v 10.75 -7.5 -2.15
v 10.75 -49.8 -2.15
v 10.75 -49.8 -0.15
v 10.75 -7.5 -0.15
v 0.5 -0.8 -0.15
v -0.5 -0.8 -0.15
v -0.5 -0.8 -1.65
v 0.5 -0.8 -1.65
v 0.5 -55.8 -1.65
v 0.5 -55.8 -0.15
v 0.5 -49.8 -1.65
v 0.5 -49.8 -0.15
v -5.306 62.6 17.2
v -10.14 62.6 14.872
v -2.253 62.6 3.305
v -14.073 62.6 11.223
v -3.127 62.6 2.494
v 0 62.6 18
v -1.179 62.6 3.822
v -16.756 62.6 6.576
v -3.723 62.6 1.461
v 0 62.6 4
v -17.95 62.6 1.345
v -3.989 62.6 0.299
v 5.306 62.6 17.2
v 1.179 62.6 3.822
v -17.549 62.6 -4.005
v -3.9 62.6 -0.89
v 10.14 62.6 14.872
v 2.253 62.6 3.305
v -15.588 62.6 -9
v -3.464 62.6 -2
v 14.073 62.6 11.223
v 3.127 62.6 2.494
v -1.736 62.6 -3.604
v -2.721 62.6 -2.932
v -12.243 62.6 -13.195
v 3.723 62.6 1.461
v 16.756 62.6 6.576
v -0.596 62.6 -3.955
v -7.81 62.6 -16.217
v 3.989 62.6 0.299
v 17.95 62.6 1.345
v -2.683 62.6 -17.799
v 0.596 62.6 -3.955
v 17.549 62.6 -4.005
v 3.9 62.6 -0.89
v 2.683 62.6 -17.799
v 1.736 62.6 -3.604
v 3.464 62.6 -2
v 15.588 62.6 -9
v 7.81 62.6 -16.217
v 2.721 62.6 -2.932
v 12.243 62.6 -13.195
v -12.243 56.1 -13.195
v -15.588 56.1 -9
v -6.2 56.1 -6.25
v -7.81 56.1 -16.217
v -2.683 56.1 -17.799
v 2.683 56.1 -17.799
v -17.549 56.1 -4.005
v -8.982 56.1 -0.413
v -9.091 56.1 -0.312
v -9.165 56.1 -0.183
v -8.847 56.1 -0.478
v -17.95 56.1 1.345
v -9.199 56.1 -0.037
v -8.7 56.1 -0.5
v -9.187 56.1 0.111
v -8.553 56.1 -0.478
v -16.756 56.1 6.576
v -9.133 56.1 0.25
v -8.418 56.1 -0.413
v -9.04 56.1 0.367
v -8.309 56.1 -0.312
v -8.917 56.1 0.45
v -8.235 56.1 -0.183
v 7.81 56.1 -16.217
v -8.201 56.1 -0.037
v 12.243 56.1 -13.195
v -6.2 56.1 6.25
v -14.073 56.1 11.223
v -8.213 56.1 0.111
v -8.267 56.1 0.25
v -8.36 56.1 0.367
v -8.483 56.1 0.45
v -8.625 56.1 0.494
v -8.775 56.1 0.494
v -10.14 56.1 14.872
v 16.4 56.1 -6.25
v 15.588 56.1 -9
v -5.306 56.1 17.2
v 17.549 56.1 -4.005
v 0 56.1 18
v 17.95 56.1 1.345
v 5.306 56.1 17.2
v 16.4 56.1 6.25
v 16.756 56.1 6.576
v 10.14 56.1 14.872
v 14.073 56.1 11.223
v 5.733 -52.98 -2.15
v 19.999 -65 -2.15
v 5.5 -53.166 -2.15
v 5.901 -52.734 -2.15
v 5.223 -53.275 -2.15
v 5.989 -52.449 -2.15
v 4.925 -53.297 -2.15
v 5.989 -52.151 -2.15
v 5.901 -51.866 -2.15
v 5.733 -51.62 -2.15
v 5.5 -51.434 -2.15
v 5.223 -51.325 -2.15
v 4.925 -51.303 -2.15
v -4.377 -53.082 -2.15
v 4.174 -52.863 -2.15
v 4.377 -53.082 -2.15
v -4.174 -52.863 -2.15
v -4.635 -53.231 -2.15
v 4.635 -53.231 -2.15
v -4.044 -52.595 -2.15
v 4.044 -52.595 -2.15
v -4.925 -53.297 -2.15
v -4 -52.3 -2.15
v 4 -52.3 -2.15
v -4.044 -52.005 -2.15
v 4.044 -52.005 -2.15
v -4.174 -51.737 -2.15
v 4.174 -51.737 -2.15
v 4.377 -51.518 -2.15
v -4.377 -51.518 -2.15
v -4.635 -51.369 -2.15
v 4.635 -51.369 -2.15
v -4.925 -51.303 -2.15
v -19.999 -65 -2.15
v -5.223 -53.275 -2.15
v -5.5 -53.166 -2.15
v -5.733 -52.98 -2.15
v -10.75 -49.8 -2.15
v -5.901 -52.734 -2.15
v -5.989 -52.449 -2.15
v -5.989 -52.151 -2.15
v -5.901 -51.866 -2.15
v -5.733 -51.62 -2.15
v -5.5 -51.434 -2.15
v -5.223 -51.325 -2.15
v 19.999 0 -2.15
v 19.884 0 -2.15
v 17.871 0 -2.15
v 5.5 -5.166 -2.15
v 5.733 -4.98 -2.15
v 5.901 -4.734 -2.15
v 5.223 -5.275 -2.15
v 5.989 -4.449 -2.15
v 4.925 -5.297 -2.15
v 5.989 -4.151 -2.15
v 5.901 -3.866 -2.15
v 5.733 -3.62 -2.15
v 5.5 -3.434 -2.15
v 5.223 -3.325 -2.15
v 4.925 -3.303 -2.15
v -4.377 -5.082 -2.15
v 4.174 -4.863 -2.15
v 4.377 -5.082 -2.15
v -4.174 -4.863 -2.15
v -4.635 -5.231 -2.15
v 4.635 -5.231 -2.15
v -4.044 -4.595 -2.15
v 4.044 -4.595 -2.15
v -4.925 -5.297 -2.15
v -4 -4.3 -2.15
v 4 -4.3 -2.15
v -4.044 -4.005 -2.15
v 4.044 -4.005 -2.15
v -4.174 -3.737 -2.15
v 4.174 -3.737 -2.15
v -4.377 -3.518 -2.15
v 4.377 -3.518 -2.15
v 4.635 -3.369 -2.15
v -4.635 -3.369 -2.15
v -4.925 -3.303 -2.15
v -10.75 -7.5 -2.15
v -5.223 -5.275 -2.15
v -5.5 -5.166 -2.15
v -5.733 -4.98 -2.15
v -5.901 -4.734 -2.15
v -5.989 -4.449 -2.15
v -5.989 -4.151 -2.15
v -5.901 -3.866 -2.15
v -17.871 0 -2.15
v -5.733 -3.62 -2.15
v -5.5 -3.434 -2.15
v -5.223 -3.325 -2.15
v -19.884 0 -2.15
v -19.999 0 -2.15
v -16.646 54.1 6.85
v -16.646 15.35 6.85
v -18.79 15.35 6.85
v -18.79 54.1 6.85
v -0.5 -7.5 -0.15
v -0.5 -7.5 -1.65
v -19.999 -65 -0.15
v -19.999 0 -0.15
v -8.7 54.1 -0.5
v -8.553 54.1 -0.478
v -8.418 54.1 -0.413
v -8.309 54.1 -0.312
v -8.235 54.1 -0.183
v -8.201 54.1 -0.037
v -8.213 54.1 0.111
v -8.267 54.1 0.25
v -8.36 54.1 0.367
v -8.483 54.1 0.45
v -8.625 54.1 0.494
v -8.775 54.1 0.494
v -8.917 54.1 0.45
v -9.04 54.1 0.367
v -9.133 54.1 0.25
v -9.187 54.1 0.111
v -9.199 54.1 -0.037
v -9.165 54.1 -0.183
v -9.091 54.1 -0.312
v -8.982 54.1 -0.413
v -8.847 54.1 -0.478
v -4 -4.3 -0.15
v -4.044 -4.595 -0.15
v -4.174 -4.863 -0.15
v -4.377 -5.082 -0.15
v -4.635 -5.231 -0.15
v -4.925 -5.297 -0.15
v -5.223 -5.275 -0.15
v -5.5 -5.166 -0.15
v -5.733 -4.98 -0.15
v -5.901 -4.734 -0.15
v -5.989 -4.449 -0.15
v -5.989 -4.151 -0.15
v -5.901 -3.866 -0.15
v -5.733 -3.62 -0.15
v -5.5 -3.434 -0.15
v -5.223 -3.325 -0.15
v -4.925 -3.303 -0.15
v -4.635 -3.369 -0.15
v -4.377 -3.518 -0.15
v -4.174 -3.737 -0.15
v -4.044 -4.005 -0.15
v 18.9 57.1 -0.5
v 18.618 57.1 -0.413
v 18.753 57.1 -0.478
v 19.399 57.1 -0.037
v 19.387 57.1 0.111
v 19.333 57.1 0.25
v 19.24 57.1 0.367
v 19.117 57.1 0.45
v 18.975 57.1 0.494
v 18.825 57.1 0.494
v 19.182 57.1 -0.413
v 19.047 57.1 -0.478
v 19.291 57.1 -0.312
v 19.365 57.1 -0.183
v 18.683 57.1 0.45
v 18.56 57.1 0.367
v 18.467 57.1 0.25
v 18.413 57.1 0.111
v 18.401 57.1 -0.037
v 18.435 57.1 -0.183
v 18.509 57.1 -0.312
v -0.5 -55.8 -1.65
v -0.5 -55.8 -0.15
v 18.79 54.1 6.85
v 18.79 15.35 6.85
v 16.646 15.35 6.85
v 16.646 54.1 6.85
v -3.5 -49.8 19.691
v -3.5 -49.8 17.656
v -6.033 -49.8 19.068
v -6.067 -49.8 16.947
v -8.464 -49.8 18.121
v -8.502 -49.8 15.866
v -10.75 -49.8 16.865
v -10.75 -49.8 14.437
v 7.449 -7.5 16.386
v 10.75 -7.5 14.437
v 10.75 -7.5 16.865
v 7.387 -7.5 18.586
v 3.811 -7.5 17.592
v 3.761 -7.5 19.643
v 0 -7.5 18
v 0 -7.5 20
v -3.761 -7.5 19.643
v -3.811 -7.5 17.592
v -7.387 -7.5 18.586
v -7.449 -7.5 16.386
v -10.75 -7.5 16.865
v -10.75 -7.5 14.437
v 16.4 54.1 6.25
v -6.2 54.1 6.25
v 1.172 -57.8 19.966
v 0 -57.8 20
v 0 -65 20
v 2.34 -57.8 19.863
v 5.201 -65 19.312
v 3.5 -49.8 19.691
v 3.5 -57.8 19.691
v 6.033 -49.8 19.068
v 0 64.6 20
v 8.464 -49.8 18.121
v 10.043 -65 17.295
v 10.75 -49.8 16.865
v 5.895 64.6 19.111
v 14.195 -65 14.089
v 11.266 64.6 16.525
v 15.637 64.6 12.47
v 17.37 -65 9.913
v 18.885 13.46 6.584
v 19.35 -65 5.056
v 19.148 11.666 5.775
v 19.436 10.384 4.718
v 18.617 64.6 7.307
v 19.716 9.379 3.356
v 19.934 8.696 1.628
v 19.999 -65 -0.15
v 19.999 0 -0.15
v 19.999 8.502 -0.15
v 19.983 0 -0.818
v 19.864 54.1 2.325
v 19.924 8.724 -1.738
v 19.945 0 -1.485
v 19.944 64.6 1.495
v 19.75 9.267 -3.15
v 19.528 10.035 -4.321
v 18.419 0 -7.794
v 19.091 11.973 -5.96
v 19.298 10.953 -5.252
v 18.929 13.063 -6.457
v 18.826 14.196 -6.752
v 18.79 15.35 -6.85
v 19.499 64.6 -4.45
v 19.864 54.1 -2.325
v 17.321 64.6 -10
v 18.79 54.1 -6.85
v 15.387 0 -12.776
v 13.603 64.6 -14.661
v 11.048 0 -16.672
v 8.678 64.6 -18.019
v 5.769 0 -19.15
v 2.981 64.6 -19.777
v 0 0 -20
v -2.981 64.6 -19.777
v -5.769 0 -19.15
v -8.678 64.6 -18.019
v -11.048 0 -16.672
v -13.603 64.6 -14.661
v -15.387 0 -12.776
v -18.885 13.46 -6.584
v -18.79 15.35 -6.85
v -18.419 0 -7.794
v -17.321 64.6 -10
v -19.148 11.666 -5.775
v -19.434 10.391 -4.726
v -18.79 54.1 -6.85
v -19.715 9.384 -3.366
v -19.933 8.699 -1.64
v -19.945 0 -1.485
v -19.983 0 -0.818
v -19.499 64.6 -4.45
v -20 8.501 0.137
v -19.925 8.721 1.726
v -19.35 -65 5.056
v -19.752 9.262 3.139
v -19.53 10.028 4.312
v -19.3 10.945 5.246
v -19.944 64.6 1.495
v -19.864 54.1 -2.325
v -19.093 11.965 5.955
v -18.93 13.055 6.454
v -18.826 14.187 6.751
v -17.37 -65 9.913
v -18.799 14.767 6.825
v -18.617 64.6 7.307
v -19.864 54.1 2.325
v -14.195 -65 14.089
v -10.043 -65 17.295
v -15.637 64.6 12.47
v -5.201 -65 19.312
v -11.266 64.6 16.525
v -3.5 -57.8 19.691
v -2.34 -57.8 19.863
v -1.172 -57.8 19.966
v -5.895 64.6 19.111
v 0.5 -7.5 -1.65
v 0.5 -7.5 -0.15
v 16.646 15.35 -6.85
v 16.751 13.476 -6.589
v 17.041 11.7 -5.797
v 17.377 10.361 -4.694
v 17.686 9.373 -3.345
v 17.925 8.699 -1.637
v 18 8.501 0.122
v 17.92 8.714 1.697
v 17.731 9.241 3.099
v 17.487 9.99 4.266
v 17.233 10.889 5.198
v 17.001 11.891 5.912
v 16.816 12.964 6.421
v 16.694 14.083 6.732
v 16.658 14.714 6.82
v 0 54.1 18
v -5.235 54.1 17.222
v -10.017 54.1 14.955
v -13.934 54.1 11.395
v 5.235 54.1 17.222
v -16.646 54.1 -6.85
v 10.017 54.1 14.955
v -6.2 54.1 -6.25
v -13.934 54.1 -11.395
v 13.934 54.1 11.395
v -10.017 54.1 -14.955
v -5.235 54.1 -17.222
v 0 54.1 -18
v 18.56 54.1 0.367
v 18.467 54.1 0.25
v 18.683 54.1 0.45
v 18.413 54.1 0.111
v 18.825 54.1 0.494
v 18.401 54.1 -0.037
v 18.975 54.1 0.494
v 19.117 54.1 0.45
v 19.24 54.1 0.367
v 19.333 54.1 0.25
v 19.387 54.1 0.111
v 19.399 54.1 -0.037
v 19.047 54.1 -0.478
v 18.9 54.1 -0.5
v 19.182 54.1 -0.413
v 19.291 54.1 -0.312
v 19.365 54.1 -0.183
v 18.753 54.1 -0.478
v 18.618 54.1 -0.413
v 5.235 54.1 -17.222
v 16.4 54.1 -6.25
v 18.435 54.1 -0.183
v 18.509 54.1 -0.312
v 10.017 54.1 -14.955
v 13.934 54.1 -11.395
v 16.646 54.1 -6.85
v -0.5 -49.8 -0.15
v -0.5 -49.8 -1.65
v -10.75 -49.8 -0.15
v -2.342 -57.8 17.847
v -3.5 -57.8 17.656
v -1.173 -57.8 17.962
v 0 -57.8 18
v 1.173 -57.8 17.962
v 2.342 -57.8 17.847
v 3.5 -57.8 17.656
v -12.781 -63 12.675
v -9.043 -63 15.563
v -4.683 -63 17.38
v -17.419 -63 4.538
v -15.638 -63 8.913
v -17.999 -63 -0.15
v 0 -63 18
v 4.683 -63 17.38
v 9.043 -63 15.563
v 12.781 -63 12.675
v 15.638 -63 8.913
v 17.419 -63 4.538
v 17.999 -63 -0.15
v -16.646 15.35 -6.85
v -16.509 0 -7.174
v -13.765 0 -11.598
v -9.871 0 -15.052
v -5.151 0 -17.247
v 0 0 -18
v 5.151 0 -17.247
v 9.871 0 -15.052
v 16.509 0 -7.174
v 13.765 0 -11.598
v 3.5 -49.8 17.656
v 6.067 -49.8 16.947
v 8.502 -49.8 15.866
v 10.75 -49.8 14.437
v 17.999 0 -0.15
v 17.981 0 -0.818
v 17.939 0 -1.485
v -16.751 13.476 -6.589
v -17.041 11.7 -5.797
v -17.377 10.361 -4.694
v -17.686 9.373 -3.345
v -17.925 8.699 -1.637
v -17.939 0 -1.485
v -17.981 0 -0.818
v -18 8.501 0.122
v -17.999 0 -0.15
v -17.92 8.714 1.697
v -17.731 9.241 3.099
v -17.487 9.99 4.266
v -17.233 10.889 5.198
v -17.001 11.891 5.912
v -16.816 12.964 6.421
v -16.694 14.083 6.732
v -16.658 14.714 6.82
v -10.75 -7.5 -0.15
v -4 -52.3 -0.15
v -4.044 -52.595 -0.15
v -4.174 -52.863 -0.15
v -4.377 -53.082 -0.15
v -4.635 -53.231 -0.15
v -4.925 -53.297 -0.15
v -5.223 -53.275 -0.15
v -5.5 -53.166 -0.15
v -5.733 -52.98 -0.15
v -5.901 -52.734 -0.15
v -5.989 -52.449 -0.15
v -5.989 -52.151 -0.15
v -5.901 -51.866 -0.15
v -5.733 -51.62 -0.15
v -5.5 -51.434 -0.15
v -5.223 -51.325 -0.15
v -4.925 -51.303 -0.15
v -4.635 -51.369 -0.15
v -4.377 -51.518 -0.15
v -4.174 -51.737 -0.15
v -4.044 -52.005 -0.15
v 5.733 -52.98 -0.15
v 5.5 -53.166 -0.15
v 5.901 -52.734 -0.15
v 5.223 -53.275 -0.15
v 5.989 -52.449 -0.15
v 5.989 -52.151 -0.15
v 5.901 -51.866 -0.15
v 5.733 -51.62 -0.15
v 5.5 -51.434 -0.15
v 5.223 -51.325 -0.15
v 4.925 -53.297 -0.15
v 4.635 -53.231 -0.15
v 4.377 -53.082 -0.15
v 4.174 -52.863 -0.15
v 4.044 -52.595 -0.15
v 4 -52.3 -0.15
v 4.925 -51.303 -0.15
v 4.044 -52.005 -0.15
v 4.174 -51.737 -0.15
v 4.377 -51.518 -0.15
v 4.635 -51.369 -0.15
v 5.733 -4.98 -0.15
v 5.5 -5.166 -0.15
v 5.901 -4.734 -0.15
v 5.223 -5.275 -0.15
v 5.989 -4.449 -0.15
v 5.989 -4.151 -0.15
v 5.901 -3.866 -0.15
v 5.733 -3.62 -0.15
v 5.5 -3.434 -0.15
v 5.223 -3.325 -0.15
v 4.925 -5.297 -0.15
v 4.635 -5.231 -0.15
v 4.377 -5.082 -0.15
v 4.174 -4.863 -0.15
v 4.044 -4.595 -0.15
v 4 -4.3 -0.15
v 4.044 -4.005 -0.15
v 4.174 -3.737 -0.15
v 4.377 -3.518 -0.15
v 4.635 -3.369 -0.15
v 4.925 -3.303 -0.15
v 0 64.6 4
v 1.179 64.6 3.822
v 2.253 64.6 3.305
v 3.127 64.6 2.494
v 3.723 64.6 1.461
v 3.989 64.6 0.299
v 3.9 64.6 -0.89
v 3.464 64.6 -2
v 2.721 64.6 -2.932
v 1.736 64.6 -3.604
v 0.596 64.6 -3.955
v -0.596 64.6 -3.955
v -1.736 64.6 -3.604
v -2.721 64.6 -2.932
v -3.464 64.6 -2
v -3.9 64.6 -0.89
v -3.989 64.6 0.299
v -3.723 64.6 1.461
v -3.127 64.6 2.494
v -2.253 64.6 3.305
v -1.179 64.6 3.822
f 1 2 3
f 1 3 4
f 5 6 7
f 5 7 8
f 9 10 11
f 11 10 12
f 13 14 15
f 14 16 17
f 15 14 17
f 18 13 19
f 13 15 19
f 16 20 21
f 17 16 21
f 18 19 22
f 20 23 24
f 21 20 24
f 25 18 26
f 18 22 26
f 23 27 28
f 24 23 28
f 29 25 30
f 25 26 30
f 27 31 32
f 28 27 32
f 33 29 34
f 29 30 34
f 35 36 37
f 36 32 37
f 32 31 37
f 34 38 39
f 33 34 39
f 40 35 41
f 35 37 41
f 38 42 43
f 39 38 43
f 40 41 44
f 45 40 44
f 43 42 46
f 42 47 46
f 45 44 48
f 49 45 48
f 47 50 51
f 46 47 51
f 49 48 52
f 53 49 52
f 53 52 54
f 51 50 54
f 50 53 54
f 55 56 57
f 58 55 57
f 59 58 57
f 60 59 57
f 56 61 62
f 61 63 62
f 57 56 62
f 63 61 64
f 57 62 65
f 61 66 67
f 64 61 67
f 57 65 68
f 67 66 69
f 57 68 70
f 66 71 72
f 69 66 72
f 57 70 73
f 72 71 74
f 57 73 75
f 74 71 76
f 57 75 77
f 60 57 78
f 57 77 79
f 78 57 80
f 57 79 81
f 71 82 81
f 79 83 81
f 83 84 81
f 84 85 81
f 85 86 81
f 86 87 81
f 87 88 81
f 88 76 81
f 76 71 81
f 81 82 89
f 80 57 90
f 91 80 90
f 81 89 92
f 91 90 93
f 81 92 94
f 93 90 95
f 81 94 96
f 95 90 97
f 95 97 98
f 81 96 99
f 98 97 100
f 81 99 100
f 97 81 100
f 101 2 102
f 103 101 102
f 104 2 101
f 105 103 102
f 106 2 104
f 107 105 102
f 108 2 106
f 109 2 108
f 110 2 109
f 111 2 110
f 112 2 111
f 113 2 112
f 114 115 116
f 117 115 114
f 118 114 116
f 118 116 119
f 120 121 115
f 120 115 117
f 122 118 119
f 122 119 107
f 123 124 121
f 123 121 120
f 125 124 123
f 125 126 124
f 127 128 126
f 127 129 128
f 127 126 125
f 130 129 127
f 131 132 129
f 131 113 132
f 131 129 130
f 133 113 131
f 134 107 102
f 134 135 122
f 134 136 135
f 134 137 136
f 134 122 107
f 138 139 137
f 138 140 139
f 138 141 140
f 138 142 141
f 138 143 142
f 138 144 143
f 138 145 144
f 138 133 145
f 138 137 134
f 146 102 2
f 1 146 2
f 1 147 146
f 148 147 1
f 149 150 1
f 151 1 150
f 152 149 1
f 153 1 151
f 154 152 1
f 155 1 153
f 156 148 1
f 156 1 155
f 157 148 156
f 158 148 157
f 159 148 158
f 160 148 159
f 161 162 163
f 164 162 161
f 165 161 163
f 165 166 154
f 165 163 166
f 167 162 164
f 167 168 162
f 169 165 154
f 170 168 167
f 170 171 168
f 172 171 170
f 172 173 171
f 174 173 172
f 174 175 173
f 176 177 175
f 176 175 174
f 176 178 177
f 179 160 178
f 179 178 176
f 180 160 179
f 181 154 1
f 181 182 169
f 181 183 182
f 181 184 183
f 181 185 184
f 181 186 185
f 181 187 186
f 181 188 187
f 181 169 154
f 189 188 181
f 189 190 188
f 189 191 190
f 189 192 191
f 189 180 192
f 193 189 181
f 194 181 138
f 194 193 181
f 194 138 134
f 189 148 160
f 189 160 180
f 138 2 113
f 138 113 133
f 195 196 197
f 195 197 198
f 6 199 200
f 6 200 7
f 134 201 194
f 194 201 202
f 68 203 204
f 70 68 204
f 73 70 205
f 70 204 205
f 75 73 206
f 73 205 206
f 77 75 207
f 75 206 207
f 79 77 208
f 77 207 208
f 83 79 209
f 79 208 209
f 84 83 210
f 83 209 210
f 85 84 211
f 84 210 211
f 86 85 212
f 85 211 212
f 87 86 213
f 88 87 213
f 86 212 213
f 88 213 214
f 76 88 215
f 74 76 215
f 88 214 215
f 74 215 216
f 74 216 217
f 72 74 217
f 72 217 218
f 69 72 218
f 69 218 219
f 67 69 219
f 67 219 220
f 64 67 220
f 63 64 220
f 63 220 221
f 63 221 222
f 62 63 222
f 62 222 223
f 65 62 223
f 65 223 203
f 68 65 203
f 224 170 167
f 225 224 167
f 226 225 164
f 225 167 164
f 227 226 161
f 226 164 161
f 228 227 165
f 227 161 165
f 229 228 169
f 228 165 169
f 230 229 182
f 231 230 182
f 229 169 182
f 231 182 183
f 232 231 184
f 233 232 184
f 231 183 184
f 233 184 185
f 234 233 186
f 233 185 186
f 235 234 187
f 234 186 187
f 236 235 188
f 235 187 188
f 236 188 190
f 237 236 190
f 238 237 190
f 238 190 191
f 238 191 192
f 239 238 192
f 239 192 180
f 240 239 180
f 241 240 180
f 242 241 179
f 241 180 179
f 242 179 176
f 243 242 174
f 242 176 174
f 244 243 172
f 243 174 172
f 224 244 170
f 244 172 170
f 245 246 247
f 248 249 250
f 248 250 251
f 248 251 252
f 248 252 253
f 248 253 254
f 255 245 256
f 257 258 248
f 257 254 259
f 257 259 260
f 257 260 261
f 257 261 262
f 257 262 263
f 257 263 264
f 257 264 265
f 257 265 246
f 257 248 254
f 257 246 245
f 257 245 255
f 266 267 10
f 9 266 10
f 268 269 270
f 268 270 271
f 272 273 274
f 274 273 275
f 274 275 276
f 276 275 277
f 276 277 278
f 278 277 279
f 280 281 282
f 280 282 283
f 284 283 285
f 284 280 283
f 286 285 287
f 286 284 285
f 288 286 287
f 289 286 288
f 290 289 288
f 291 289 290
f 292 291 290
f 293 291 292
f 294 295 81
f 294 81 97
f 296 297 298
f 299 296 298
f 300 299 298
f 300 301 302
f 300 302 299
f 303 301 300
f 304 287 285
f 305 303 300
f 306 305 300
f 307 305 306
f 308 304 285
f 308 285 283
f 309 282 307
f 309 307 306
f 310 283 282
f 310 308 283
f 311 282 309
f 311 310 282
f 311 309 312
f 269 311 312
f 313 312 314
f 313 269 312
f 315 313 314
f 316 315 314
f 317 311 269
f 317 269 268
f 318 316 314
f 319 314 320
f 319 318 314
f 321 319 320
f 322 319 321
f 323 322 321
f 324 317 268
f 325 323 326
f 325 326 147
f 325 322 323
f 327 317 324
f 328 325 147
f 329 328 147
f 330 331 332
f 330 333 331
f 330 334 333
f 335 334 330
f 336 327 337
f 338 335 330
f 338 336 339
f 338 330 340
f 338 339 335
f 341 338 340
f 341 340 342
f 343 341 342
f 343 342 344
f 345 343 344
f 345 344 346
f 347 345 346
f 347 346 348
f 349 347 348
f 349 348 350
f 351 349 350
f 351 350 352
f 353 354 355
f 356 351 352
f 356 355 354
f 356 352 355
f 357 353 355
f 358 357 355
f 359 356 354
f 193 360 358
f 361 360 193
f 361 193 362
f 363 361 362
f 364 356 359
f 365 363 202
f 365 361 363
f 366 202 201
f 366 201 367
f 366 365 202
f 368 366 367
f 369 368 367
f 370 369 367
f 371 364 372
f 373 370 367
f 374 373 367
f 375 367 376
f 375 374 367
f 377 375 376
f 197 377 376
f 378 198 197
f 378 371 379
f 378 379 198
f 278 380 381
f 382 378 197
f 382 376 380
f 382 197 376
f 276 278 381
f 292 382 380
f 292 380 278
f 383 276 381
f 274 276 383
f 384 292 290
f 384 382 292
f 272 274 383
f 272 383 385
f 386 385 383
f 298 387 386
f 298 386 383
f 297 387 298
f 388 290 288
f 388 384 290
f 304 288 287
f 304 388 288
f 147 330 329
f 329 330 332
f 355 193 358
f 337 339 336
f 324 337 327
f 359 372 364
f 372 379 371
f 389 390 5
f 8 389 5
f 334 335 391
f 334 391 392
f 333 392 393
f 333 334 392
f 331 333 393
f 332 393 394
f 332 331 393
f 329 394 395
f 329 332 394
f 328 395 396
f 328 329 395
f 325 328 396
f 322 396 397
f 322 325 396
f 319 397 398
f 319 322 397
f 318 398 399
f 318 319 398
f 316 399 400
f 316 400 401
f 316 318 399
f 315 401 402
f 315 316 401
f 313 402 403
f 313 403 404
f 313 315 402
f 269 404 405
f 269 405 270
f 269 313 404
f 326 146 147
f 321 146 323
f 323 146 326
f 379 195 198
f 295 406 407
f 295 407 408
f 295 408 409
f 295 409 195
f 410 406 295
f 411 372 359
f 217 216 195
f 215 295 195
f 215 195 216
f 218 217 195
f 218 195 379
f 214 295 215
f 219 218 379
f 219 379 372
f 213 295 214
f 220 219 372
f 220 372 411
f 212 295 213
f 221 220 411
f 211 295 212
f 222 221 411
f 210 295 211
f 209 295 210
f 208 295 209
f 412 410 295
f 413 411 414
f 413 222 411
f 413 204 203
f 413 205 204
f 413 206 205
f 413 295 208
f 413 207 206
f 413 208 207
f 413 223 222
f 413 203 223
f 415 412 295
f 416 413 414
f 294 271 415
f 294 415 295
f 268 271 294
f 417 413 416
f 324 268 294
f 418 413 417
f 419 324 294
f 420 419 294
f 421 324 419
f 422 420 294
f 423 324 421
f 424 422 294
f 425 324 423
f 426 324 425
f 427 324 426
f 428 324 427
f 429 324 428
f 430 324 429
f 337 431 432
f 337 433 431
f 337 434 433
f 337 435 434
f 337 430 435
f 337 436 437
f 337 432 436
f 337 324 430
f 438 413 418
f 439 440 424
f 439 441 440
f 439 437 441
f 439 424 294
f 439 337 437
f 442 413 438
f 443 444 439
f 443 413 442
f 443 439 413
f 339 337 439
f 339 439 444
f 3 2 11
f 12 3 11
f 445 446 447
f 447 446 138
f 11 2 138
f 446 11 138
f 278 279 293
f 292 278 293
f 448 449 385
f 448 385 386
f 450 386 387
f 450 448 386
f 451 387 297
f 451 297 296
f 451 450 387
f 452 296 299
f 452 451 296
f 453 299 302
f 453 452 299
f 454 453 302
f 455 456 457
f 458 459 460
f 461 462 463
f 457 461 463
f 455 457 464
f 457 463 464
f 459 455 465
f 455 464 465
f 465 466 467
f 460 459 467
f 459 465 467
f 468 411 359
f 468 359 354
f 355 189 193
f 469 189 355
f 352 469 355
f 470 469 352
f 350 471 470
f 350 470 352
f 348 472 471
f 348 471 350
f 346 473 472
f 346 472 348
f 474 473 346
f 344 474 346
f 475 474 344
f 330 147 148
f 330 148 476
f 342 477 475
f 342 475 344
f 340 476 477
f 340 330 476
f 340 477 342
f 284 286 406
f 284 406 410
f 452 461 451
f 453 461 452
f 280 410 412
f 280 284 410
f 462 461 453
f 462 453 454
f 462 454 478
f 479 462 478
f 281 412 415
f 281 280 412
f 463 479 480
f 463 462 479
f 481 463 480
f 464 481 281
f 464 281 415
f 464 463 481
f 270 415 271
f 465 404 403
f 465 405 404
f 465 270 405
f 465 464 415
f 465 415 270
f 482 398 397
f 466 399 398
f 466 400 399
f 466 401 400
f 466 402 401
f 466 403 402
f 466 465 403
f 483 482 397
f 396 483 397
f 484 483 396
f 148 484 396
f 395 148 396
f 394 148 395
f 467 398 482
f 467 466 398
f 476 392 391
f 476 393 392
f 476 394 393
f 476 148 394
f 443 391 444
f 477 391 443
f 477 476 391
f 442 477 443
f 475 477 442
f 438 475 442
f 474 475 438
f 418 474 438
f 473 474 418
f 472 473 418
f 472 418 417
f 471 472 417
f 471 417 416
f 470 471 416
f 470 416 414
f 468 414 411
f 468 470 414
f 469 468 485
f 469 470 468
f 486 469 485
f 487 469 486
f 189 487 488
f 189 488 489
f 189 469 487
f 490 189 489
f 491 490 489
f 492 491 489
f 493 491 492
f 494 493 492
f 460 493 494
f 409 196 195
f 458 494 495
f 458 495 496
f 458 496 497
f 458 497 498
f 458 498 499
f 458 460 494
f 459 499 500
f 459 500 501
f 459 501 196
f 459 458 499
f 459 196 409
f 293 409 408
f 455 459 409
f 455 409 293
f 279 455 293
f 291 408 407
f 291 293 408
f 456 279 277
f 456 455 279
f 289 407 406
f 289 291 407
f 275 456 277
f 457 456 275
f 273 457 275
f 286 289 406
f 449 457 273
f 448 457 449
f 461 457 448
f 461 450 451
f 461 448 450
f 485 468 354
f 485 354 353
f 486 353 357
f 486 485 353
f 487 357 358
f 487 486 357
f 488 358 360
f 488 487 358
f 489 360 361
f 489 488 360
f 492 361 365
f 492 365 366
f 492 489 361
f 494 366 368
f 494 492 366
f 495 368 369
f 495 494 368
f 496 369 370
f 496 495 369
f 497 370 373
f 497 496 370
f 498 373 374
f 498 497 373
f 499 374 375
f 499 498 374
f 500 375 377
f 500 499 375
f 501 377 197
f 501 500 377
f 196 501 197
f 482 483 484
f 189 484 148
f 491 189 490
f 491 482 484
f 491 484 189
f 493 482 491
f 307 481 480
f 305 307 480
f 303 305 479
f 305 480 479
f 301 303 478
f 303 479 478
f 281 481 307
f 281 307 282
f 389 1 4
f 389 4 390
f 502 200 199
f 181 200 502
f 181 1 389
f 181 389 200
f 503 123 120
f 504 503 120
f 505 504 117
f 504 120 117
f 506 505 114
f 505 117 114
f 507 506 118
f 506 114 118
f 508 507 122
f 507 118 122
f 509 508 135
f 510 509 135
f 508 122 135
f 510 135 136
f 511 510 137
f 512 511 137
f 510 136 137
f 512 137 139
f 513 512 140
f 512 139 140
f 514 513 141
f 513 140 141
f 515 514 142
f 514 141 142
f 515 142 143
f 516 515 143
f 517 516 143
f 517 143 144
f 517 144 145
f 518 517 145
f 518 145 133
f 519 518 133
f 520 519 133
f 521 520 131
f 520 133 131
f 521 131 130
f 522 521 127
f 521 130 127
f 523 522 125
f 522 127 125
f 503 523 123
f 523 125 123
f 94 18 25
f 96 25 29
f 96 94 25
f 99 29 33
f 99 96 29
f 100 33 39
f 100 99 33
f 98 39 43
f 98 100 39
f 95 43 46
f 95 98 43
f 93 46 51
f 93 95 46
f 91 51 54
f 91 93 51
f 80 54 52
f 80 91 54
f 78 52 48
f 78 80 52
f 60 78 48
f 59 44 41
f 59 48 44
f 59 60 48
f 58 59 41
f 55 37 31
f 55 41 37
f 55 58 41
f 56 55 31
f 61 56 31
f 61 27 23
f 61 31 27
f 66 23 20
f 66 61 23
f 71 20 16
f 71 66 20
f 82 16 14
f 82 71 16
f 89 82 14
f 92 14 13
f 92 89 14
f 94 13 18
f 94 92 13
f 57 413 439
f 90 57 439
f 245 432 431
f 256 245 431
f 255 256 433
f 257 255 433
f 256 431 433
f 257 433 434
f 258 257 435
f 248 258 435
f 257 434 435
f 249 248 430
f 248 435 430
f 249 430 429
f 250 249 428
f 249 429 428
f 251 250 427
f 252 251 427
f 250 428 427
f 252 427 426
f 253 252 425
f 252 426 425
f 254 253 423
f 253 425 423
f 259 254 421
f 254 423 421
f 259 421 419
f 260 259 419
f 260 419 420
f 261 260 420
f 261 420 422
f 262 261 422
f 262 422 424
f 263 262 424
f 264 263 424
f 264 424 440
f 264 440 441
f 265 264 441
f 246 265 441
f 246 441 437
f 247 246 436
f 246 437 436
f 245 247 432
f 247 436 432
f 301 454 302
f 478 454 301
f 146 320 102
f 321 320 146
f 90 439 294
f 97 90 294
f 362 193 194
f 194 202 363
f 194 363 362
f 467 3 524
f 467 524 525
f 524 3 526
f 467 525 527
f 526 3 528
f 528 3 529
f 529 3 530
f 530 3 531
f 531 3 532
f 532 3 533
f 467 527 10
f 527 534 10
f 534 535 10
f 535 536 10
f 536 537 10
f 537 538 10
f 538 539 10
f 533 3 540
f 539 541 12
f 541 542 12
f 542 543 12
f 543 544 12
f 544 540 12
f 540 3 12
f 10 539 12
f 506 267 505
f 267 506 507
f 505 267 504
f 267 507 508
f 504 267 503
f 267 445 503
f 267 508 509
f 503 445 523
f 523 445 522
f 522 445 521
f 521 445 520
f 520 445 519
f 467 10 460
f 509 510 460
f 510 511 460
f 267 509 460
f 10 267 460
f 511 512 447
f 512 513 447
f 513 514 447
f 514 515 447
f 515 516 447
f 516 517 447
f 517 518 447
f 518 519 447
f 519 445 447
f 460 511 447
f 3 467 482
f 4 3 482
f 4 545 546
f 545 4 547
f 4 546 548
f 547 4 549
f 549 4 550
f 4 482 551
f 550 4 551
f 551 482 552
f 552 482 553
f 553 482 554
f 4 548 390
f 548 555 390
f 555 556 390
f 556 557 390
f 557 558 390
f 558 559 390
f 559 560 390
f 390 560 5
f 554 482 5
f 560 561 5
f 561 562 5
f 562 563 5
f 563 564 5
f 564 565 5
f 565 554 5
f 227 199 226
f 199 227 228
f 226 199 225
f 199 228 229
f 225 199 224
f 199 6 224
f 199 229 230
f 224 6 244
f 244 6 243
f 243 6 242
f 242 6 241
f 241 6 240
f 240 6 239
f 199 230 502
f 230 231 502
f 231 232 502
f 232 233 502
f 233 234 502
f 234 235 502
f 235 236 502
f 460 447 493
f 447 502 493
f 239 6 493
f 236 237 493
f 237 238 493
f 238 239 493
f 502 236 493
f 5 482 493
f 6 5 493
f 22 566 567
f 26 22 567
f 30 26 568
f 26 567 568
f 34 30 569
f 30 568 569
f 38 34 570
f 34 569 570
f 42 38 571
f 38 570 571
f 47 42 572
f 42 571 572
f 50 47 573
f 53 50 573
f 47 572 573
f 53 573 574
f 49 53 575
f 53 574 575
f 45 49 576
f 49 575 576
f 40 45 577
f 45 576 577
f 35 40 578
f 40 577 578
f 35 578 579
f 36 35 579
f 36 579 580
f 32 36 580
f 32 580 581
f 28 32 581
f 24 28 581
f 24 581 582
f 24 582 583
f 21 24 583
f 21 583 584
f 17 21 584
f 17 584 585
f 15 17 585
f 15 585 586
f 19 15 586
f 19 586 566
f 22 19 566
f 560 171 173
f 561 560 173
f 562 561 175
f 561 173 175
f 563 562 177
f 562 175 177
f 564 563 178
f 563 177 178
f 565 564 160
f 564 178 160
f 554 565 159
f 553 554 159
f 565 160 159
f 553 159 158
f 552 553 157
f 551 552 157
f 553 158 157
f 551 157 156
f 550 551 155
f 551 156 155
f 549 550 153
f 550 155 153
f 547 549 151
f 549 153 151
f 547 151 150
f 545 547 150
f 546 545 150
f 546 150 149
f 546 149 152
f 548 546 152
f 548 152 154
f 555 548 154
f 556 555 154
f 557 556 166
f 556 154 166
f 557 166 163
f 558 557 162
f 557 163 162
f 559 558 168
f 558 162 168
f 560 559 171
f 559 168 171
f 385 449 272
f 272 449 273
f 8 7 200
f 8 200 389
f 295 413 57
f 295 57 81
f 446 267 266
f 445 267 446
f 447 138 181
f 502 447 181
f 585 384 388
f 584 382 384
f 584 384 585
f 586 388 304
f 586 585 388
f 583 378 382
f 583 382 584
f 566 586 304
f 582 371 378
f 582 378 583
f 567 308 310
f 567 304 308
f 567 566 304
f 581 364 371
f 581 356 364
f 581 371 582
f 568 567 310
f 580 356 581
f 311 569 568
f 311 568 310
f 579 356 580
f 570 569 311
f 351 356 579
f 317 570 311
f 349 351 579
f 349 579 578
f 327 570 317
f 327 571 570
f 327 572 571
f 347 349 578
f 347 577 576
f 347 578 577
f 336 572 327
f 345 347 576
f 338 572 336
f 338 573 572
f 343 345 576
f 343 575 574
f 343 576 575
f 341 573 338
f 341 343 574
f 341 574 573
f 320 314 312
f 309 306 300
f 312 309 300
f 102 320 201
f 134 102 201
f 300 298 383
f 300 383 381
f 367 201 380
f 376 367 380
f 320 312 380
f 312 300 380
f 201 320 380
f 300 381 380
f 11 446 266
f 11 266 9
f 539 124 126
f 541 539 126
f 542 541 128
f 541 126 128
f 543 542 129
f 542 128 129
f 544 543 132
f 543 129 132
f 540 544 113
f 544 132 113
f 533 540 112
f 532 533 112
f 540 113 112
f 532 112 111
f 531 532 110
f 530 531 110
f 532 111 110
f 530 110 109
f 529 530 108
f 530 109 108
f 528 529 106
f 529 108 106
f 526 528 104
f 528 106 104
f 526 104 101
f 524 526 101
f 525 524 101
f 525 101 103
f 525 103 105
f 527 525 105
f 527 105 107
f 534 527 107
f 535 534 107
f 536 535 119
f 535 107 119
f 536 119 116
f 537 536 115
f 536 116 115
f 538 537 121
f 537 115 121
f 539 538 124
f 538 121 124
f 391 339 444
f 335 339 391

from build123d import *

# Parameters (mm, degrees)
SKETCH1_R           = 20
SKETCH1_R_2         = 18
BOSS_EXTRUDE1_DEPTH = 65
SKETCH2_R           = 18
BOSS_EXTRUDE2_DEPTH = 2
SKETCH4_W           = 24.70942711
SKETCH4_H           = 65
CUT_EXTRUDE1_DEPTH  = 79.89866919
SKETCH5_W           = 39.998874984
SKETCH5_H           = 65
BOSS_EXTRUDE3_DEPTH = 2
SKETCH6_W           = 21.5
SKETCH6_H           = 42.3
CUT_EXTRUDE2_DEPTH  = 72.523580028
SKETCH7_R           = 1
CUT_EXTRUDE3_DEPTH  = 2
SKETCH8_W           = 1
SKETCH8_H           = 55
CUT_EXTRUDE4_DEPTH  = 1.5
BOSS_EXTRUDE4_START = -2.4
SKETCH9_R           = 18
BOSS_EXTRUDE4_DEPTH = 2.4
CUT_EXTRUDE5_DEPTH  = 79.89866919
SKETCH11_R          = 18.596328204
SKETCH11_W          = 22.6
SKETCH11_H          = 12.5
BOSS_EXTRUDE6_DEPTH = 2
SKETCH12_R          = 0.5
CUT_EXTRUDE6_DEPTH  = 3
SKETCH15_R          = 4
CUT_EXTRUDE8_DEPTH  = 5
SKETCH16_R          = 20
CUT_EXTRUDE9_DEPTH  = 0.4
SKETCH18_W          = 7
SKETCH18_H          = 8
CUT_EXTRUDE10_DEPTH = 71.929701261


with BuildPart() as part:
    # Sketch1 → Boss-Extrude1 (new, symmetric)
    with BuildSketch(Plane(origin=(0, 0, 0), x_dir=(1, 0, 0), z_dir=(0, 1, 0))):
        with Locations(Location((0, 0, 0), (0, 0, 270))):
            Circle(SKETCH1_R)
        with Locations(Location((0, 0, 0), (0, 0, 270))):
            Circle(SKETCH1_R_2, mode=Mode.SUBTRACT)
    extrude(amount=BOSS_EXTRUDE1_DEPTH, both=True)

    # Sketch2 → Boss-Extrude2 (add)
    with BuildSketch(Plane.XZ.offset(65)):
        with Locations(Location((0, 0, 0), (0, 0, 270))):
            Circle(SKETCH2_R)
    extrude(amount=-BOSS_EXTRUDE2_DEPTH)

    # Sketch4 → Cut-Extrude1 (cut, through all)
    with BuildSketch(Plane(origin=(20, 0, 0), x_dir=(0, 0, -1), z_dir=(1, 0, 0))):
        with Locations((12.504713555, -32.5)):
            Rectangle(SKETCH4_W, SKETCH4_H)
    extrude(amount=-CUT_EXTRUDE1_DEPTH, mode=Mode.SUBTRACT)

    # Sketch5 → Boss-Extrude3 (add)
    with BuildSketch(Plane(origin=(0, 0, -0.15), x_dir=(-1, 0, 0), z_dir=(0, 0, -1))):
        with Locations((0, -32.5)):
            Rectangle(SKETCH5_W, SKETCH5_H)
    extrude(amount=BOSS_EXTRUDE3_DEPTH)

    # Sketch6 → Cut-Extrude2 (cut, through all)
    with BuildSketch(Plane(origin=(0, 0, -2.15), x_dir=(-1, 0, 0), z_dir=(0, 0, -1))):
        with Locations((0, -28.65)):
            Rectangle(SKETCH6_W, SKETCH6_H)
    extrude(amount=-CUT_EXTRUDE2_DEPTH, mode=Mode.SUBTRACT)

    # Sketch7 → Cut-Extrude3 (cut)
    with BuildSketch(Plane(origin=(0, 0, -2.15), x_dir=(-1, 0, 0), z_dir=(0, 0, -1))):
        with Locations((-5, -4.3)):
            Circle(SKETCH7_R)
        with Locations((-5, -52.3)):
            Circle(SKETCH7_R)
        with Locations(Location((5, -52.3, 0), (0, 0, 180))):
            Circle(SKETCH7_R)
        with Locations(Location((5, -4.3, 0), (0, 0, 180))):
            Circle(SKETCH7_R)
    extrude(amount=-CUT_EXTRUDE3_DEPTH, mode=Mode.SUBTRACT)

    # Sketch8 → Cut-Extrude4 (cut)
    with BuildSketch(Plane.XY.offset(-0.15)):
        with Locations((0, -28.3)):
            Rectangle(SKETCH8_W, SKETCH8_H)
    extrude(amount=-CUT_EXTRUDE4_DEPTH, mode=Mode.SUBTRACT)

    # Sketch9 → Boss-Extrude4 (add)
    with BuildSketch(Plane(origin=(0, 65, 0), x_dir=(1, 0, 0), z_dir=(0, 1, 0)).offset(BOSS_EXTRUDE4_START)):
        with Locations(Location((0, 0, 0), (0, 0, 6.860040985))):
            Circle(SKETCH9_R)
    extrude(amount=BOSS_EXTRUDE4_DEPTH)

    # Sketch10 → Cut-Extrude5 (cut, through all)
    with BuildSketch(Plane(origin=(20, 0, 0), x_dir=(0, 0, -1), z_dir=(1, 0, 0))):
        with BuildLine():
            Line((-6.85, 54.1), (6.85, 54.1))
            Line((6.85, 54.1), (6.85, 15.35))
            ThreePointArc((6.85, 15.35), (0, 8.5), (-6.85, 15.35))
            Line((-6.85, 15.35), (-6.85, 54.1))
        make_face()
    extrude(amount=-CUT_EXTRUDE5_DEPTH, mode=Mode.SUBTRACT)

    # Sketch11 → Boss-Extrude6 (add)
    with BuildSketch(Plane.XZ.offset(-54.1)):
        Circle(SKETCH11_R)
        with Locations((5.1, 0)):
            Rectangle(SKETCH11_W, SKETCH11_H, mode=Mode.SUBTRACT)
    extrude(amount=-BOSS_EXTRUDE6_DEPTH)

    # Sketch12 → Cut-Extrude6 (cut)
    with BuildSketch(Plane.XZ.offset(-54.1)):
        with Locations(Location((18.9, 0, 0), (0, 0, 270))):
            Circle(SKETCH12_R)
        with Locations(Location((-8.7, 0, 0), (0, 0, 270))):
            Circle(SKETCH12_R)
    extrude(amount=-CUT_EXTRUDE6_DEPTH, mode=Mode.SUBTRACT)

    # Sketch15 → Cut-Extrude8 (cut)
    with BuildSketch(Plane(origin=(0, 65, 0), x_dir=(1, 0, 0), z_dir=(0, 1, 0))):
        with Locations(Location((0, 0, 0), (0, 0, 270))):
            Circle(SKETCH15_R)
    extrude(amount=-CUT_EXTRUDE8_DEPTH, mode=Mode.SUBTRACT)

    # Sketch16 → Cut-Extrude9 (cut)
    with BuildSketch(Plane(origin=(0, 65, 0), x_dir=(1, 0, 0), z_dir=(0, 1, 0))):
        with Locations(Location((0, 0, 0), (0, 0, 6.171221478))):
            Circle(SKETCH16_R)
    extrude(amount=-CUT_EXTRUDE9_DEPTH, mode=Mode.SUBTRACT)

    # Sketch18 → Cut-Extrude10 (cut, through all)
    with BuildSketch(Plane.XY.offset(-0.15)):
        with Locations((0, -53.8)):
            Rectangle(SKETCH18_W, SKETCH18_H)
    extrude(amount=CUT_EXTRUDE10_DEPTH, mode=Mode.SUBTRACT)


solid = part.part
